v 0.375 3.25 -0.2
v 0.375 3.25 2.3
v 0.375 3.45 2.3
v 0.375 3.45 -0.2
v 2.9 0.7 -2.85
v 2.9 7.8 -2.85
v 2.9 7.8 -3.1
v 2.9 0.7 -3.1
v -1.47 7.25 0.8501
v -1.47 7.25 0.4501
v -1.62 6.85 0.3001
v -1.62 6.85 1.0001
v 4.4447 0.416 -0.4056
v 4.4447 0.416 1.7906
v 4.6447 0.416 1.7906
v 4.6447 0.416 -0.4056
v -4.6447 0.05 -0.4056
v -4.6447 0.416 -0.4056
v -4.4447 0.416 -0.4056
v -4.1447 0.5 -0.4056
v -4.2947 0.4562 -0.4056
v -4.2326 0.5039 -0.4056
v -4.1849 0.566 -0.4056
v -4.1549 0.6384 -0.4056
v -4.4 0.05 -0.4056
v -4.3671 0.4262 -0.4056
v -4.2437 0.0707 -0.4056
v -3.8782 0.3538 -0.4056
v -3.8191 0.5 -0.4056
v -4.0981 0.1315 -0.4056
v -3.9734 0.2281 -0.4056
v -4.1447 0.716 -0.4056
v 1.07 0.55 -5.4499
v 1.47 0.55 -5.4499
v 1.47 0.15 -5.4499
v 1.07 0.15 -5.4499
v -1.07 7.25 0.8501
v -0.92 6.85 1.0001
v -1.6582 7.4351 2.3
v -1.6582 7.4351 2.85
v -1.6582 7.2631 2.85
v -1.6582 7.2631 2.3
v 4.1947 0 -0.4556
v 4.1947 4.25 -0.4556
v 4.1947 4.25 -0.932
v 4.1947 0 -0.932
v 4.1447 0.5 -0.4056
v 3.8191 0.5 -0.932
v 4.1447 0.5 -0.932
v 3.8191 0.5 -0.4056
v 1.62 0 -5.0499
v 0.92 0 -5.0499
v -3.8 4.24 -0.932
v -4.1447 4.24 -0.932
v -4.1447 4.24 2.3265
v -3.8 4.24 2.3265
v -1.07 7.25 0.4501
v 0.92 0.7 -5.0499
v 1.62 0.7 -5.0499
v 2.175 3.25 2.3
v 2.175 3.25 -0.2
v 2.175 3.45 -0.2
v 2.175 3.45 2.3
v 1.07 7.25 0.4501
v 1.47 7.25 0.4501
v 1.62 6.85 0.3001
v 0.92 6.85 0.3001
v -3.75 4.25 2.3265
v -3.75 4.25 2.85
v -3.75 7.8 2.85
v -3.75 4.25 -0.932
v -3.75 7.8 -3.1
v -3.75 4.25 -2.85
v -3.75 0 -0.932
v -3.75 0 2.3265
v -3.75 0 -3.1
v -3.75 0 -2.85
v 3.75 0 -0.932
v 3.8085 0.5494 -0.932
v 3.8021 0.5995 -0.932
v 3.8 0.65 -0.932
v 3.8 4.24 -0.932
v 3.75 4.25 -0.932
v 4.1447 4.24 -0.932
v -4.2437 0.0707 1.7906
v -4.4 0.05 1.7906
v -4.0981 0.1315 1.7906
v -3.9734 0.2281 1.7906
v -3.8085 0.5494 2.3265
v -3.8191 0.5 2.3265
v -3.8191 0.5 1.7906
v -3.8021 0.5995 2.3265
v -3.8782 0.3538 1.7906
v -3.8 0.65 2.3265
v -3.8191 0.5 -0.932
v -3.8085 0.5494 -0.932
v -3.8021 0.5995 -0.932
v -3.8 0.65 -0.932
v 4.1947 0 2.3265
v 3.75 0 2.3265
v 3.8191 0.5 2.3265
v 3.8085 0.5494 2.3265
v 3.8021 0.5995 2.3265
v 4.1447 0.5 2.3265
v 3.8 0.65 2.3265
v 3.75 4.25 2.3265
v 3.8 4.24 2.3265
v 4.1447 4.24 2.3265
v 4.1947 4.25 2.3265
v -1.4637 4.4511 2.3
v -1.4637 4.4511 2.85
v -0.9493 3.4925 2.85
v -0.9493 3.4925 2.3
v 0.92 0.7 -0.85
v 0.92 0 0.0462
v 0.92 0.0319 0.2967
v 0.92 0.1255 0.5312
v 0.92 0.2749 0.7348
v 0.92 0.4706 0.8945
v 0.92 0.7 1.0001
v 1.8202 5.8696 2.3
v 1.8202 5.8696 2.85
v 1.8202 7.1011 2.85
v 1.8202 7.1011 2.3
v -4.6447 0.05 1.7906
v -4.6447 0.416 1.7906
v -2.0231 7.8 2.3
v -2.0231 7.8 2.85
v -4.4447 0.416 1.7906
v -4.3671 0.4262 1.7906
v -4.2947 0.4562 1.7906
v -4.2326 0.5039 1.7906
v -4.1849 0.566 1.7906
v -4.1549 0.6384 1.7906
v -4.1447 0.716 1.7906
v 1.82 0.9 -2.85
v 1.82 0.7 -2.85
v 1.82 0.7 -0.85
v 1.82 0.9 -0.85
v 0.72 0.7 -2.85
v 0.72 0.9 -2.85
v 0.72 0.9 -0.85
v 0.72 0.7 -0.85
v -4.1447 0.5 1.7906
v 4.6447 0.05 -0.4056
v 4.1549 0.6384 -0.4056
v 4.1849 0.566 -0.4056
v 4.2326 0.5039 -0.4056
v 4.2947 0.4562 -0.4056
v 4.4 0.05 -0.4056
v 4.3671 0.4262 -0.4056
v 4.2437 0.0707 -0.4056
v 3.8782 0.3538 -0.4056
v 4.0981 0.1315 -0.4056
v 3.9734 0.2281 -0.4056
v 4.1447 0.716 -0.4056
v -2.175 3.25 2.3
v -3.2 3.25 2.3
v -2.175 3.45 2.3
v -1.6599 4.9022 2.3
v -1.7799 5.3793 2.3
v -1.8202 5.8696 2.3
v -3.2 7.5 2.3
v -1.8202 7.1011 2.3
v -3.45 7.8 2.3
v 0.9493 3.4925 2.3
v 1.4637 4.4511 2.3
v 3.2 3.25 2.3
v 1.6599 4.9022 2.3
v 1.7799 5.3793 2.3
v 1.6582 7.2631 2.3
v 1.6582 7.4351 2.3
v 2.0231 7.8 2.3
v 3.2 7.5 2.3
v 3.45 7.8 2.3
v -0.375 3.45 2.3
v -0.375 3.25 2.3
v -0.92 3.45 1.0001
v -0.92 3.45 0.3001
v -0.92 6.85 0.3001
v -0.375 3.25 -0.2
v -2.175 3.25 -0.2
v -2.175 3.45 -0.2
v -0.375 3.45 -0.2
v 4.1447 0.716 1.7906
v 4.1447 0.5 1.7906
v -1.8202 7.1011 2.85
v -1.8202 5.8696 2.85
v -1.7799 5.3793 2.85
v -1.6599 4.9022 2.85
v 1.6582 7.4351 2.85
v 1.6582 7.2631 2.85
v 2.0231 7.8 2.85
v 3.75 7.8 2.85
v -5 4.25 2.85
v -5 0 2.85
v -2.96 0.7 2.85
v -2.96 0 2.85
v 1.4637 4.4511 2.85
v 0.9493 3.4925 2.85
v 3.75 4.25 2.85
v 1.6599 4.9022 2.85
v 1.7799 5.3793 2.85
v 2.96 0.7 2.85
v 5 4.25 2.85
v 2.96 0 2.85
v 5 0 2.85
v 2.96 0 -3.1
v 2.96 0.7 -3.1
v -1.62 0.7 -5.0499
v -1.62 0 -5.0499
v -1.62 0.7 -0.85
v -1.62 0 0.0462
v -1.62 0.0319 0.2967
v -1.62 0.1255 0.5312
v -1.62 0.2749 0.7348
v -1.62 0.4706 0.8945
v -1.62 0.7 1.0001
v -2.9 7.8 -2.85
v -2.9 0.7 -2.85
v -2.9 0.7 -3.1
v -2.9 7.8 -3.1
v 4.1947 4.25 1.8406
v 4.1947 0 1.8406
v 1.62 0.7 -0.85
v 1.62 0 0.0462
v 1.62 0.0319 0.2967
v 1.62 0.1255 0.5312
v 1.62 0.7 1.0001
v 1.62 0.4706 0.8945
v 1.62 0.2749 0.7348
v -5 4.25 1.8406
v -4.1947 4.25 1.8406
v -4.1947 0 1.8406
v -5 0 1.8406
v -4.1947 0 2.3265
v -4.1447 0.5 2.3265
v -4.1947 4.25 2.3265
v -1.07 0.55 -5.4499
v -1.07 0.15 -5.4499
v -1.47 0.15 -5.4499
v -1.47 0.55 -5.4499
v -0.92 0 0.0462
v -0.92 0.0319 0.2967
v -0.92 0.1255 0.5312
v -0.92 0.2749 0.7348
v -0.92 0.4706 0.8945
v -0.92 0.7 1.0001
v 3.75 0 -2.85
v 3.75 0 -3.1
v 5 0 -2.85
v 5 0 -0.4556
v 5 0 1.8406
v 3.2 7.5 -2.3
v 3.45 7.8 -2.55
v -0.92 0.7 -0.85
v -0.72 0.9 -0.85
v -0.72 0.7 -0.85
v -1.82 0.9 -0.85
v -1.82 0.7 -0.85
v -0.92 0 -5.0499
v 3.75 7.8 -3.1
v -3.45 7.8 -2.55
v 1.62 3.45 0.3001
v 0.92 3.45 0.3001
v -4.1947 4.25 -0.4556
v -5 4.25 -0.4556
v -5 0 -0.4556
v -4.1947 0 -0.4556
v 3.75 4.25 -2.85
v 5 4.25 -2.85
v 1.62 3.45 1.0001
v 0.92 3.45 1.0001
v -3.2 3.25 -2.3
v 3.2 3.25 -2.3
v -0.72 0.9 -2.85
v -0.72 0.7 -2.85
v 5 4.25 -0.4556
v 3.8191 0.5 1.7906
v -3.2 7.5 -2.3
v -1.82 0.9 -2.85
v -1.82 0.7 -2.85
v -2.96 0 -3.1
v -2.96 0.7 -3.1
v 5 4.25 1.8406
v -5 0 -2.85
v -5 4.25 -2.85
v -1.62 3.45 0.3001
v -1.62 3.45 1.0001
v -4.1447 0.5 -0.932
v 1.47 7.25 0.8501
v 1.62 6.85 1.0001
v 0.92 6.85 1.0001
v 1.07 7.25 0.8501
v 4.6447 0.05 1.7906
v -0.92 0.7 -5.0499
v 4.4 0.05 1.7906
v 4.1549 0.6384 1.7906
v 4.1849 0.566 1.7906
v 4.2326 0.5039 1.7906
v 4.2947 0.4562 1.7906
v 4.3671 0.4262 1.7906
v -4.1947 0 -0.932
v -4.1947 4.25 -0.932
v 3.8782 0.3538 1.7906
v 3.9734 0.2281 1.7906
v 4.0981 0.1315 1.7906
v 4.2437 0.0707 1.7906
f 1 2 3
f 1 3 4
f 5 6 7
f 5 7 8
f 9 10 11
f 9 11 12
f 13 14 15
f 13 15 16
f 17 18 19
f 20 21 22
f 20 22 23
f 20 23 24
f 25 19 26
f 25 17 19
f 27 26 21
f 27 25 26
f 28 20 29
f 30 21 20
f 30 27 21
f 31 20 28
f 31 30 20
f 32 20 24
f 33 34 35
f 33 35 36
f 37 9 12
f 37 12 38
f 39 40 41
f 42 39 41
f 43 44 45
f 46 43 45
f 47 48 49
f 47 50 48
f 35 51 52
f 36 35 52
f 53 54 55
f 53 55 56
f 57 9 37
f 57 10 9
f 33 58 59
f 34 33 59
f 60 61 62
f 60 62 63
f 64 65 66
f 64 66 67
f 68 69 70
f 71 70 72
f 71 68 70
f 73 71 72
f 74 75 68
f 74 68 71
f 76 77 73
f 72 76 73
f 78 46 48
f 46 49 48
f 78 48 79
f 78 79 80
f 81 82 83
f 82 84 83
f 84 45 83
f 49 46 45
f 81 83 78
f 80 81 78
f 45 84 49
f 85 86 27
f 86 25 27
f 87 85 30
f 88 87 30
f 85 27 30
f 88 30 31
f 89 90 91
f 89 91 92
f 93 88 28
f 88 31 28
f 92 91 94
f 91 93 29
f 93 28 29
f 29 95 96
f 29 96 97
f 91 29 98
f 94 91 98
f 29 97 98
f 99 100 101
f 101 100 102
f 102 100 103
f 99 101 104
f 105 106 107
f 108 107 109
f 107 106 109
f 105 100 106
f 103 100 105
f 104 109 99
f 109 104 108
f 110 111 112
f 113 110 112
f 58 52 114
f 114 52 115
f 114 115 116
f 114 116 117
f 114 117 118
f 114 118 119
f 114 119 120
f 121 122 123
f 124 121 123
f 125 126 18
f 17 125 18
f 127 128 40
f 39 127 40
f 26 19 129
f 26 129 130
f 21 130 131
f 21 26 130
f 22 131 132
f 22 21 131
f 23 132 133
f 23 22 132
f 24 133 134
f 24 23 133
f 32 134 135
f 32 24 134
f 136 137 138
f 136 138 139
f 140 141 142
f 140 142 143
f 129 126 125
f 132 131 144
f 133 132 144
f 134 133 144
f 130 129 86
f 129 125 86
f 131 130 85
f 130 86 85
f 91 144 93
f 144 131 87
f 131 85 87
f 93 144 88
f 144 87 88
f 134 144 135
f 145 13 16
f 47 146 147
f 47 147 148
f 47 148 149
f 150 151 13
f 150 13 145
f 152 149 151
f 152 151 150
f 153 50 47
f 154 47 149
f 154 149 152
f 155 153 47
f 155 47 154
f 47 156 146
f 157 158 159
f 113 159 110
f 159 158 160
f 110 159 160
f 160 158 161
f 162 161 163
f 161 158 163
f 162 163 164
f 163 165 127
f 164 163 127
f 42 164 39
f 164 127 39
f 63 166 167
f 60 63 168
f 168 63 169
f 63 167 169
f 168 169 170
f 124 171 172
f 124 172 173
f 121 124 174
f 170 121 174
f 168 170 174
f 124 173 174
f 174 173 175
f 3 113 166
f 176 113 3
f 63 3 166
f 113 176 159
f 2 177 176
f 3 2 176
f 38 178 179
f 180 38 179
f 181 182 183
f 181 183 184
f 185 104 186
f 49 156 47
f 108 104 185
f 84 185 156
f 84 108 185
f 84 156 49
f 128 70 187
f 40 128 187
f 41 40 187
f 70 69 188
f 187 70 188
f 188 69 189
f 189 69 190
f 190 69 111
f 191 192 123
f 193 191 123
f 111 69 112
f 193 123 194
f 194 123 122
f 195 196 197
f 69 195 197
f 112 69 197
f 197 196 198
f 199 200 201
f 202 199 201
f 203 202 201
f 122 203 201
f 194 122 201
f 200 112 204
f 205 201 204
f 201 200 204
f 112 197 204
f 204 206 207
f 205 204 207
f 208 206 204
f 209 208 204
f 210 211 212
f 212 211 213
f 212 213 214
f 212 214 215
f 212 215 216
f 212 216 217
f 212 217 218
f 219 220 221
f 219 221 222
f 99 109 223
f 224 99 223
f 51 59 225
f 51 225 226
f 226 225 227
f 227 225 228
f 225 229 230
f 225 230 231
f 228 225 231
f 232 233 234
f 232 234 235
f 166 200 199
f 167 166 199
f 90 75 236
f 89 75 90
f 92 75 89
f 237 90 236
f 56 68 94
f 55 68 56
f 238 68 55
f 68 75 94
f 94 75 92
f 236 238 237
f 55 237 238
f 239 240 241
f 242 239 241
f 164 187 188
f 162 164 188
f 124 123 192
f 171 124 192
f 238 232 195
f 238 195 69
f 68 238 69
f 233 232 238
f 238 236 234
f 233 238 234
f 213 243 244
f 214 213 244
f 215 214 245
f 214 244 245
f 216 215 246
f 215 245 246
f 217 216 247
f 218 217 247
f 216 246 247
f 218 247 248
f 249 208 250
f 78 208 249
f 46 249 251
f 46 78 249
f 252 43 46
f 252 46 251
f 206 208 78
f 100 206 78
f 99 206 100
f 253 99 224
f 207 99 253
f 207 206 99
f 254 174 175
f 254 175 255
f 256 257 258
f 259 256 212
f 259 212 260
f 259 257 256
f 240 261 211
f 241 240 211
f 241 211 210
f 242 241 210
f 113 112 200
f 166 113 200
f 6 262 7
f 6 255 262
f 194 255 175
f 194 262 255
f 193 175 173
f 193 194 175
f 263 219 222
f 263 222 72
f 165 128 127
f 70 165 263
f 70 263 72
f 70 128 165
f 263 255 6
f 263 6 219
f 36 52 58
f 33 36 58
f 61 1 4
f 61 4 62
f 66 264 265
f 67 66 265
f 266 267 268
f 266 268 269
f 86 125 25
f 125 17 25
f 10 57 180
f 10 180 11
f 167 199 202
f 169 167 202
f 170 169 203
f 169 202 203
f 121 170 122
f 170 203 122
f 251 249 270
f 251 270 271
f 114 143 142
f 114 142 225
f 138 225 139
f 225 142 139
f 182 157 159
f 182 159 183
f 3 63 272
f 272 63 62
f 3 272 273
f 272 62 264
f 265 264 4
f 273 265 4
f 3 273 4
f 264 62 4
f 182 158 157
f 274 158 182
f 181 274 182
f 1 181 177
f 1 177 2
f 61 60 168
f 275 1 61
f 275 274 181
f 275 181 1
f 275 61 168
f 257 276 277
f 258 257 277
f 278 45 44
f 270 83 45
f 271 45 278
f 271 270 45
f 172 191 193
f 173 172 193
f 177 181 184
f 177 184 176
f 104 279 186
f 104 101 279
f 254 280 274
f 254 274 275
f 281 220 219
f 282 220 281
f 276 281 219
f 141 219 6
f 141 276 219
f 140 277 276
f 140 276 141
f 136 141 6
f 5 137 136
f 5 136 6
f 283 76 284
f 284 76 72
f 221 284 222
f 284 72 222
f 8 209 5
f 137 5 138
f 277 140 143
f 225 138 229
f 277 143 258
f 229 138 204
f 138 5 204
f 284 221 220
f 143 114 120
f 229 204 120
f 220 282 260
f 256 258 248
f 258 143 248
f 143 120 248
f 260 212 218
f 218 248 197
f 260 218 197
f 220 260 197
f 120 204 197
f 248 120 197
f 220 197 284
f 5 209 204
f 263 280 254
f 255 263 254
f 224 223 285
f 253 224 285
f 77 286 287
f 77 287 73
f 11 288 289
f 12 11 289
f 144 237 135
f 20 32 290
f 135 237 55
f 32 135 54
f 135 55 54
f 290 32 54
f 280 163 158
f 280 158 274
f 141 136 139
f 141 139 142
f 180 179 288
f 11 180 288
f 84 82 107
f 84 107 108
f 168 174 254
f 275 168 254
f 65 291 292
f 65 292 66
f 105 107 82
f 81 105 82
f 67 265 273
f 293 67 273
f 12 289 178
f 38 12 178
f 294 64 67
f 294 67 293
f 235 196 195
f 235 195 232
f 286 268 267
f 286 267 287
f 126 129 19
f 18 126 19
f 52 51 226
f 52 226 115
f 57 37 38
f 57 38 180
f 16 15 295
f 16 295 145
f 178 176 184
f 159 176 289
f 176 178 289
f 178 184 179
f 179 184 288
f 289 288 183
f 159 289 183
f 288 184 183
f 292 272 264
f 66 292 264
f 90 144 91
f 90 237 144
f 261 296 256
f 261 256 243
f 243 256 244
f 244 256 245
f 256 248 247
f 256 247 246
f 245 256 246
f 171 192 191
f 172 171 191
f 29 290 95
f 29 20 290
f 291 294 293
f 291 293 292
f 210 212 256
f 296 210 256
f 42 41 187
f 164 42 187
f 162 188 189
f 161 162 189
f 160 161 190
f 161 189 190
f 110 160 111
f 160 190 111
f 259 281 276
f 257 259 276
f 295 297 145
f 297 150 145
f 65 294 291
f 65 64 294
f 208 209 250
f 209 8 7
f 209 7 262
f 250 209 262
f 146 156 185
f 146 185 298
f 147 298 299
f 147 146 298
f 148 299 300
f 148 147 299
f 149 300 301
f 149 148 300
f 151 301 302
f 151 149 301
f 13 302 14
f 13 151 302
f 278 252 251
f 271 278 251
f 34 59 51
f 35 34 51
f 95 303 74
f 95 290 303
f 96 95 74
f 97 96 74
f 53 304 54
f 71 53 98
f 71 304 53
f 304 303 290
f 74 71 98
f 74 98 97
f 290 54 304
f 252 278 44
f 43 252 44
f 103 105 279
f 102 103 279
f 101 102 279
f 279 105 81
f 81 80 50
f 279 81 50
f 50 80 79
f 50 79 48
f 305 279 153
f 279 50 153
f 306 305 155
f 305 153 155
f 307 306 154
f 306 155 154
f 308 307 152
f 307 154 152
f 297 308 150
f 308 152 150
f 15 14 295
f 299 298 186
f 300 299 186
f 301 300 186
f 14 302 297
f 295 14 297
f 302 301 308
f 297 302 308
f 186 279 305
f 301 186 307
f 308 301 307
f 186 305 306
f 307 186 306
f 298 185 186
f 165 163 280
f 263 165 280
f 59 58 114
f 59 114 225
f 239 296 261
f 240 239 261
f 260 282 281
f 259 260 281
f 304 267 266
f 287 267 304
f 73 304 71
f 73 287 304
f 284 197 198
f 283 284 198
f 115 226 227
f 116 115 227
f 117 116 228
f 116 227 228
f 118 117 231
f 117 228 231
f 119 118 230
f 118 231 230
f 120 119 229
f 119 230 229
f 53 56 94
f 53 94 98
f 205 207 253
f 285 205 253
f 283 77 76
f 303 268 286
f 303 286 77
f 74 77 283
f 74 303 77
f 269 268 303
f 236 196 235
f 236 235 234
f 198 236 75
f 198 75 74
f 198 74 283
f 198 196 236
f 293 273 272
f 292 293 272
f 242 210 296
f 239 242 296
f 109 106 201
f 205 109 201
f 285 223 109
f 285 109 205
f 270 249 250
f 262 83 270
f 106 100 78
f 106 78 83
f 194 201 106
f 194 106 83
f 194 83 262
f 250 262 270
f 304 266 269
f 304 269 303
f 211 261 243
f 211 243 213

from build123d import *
from OCP.BRepFilletAPI import BRepFilletAPI_MakeChamfer

# Parameters (mm, degrees)
SKETCH1_W           = 10
SKETCH1_H           = 5.7
BOSS_EXTRUDE1_DEPTH = 4.25
BOSS_EXTRUDE2_DEPTH = 3.55
BOSS_EXTRUDE3_DEPTH = 0.25
SKETCH4_W           = 6.399999999999999
SKETCH4_H           = 4.6
CUT_EXTRUDE1_DEPTH  = 4.55
BOSS_EXTRUDE4_DEPTH = 0.2
BOSS_EXTRUDE5_DEPTH = 4
CHAMFER1_SIZE       = 0.25
CHAMFER1_SIZE2      = 0.3
CUT_EXTRUDE5_DEPTH  = 0.55
CUT_EXTRUDE6_DEPTH  = 12.011017210049216
CHAMFER2_SIZE       = 0.4
CHAMFER2_SIZE2      = 0.15
BOSS_EXTRUDE6_DEPTH = 6.45
CHAMFER3_SIZE       = 0.15
CHAMFER3_SIZE2      = 0.4
CUT_EXTRUDE7_DEPTH  = 2
FILLET1_R           = 1
CUT_EXTRUDE8_DEPTH  = 11.749015904295446
SKETCH13_W          = 0.34470786446686574
SKETCH13_H          = 3.258573050104898
SKETCH13_H_2        = 3.2585730501048964
BOSS_EXTRUDE7_DEPTH = 4.2
SKETCH14_W          = 2.1962459212727503
SKETCH14_H          = 0.3660162451661128
BOSS_EXTRUDE8_DEPTH = 0.5
SKETCH15_W          = 0.34470786446686574
SKETCH15_H          = 0.535927560103362
SKETCH15_H_2        = 0.526399568728786
SKETCH15_H_3        = 0.5263995687287861
CUT_EXTRUDE9_DEPTH  = 0.5
SKETCH16_W          = 0.34470786446686574
SKETCH16_H          = 3.2585730501048964
SKETCH16_H_2        = 3.258573050104898
CUT_EXTRUDE10_DEPTH = 0.01
FILLET3_R           = 0.3
FILLET4_R           = 0.6


with BuildPart() as part:
    # Sketch1 → Boss-Extrude1 (new body)
    with BuildSketch(Plane(origin=(0, 0, 0), x_dir=(1, 0, 0), z_dir=(0, 1, 0))):
        Rectangle(SKETCH1_W, SKETCH1_H)
    extrude(amount=BOSS_EXTRUDE1_DEPTH)

    # Sketch2 → Boss-Extrude2 (add)
    with BuildSketch(Plane(origin=(0, 4.25, 0), x_dir=(1, 0, 0), z_dir=(0, 1, 0))):
        Polygon((-3.75, 2.8499999999999996), (3.75, 2.8499999999999996), (3.7499999999999996, -2.8500000000000005), (-3.7499999999999987, -2.8500000000000005), align=None)
    extrude(amount=BOSS_EXTRUDE2_DEPTH)

    # Sketch3 → Boss-Extrude3 (add)
    with BuildSketch(Plane(origin=(0, 0, -2.8499999999999996), x_dir=(-1, 0, 0), z_dir=(0, 0, -1))):
        Polygon((-3.75, 7.8), (-2.9, 7.8), (-2.899999999999999, 8e-17), (-3.75, 0), align=None)
        Polygon((3.75, 0), (2.899999999999999, 8e-17), (2.9, 7.8), (3.75, 7.8), align=None)
    extrude(amount=BOSS_EXTRUDE3_DEPTH)

    # Sketch4 → Cut-Extrude1 (cut)
    with BuildSketch(Plane(origin=(0, 7.8, 0), x_dir=(1, 0, 0), z_dir=(0, 1, 0))):
        Rectangle(SKETCH4_W, SKETCH4_H)
    extrude(amount=-CUT_EXTRUDE1_DEPTH, mode=Mode.SUBTRACT)

    # Sketch5 → Boss-Extrude4 (add)
    # profile 1 of 2: a face of its own
    with BuildSketch(Plane(origin=(0, 3.2499999999999996, 0), x_dir=(1, 0, 0), z_dir=(0, 1, 0))):
        Polygon((-2.174999999999999, -2.3000000000000003), (-2.174999999999999, 0.19999999999999923), (-0.3749999999999999, 0.1999999999999991), (-0.37499999999999944, -2.3000000000000003), align=None)
        Polygon((-1.6199999999999999, -0.30010615600666696), (-0.9199999999999999, -0.30010615600666696), (-0.9199999999999997, -1.0001061560066669), (-1.6199999999999997, -1.0001061560066669), align=None, mode=Mode.SUBTRACT)
    # profile 2 of 2: a face of its own
    with BuildSketch(Plane(origin=(0, 3.2499999999999996, 0), x_dir=(1, 0, 0), z_dir=(0, 1, 0))):
        Polygon((2.174999999999999, -2.3000000000000003), (0.37499999999999944, -2.3000000000000003), (0.3749999999999999, 0.1999999999999991), (2.174999999999999, 0.19999999999999923), align=None)
        Polygon((1.6199999999999997, -1.0001061560066669), (0.9199999999999997, -1.0001061560066669), (0.9199999999999999, -0.30010615600666696), (1.6199999999999999, -0.30010615600666696), align=None, mode=Mode.SUBTRACT)
    extrude(amount=BOSS_EXTRUDE4_DEPTH)

    # Sketch6 → Boss-Extrude5 (add)
    with BuildSketch(Plane(origin=(0, 3.2499999999999996, 0), x_dir=(1, 0, 0), z_dir=(0, 1, 0))):
        Polygon((-0.9199999999999997, -1.0001061560066669), (-0.9199999999999999, -0.30010615600666696), (-1.6199999999999999, -0.30010615600666696), (-1.6199999999999997, -1.0001061560066669), align=None)
        Polygon((1.6199999999999997, -1.0001061560066669), (1.6199999999999999, -0.30010615600666696), (0.9199999999999999, -0.30010615600666696), (0.9199999999999997, -1.0001061560066669), align=None)
    extrude(amount=BOSS_EXTRUDE5_DEPTH)

    # Chamfer1
    chamfer1_edges = [part.edges().sort_by_distance(p)[0] for p in [
        (3.1999999999999993, 7.8, 4.4e-16),
        (4.4e-16, 7.8, -2.2999999999999994),
        (-3.199999999999999, 7.8, 4.4e-16),
    ]]
    chamfer1_side = [part.faces().sort_by_distance(p)[0] for p in [
        (-2.99573531218939, 7.8, -2.9749999999999996),
    ]]
    chamfer(chamfer1_edges, length=CHAMFER1_SIZE, length2=CHAMFER1_SIZE2, reference=chamfer1_side[0])

    # Sketch7 → Cut-Extrude5 (cut)
    with BuildSketch(Plane.XY.offset(2.8500000000000005)):
        with BuildLine():
            Line((-2.0230768172750717, 7.8), (-1.658152916079166, 7.435076098804102))
            Line((-1.658152916079166, 7.435076098804102), (-1.658152916079166, 7.263136663157135))
            Line((-1.658152916079166, 7.263136663157135), (-1.8201957124672143, 7.101093866769083))
            Line((-1.8201957124672143, 7.101093866769083), (-1.820195712467214, 5.869596920770719))
            ThreePointArc((-1.820195712467214, 5.869596920770719), (-1.729701032325909, 5.138311207992215), (-1.4636765166579089, 4.4511438063269075))
            Line((-1.4636765166579089, 4.4511438063269075), (-0.9492914576822651, 3.492517105508663))
            Line((-0.9492914576822651, 3.492517105508663), (0.9492914576822654, 3.492517105508663))
            Line((0.9492914576822654, 3.492517105508663), (1.4636765166579093, 4.4511438063269075))
            ThreePointArc((1.4636765166579093, 4.4511438063269075), (1.7297010323259099, 5.1383112079922135), (1.8201957124672148, 5.869596920770719))
            Line((1.8201957124672148, 5.869596920770719), (1.8201957124672143, 7.101093866769083))
            Line((1.8201957124672143, 7.101093866769083), (1.6581529160791668, 7.263136663157135))
            Line((1.6581529160791668, 7.263136663157135), (1.6581529160791668, 7.435076098804102))
            Line((1.6581529160791668, 7.435076098804102), (2.0230768172750717, 7.8))
            Line((2.0230768172750717, 7.8), (-2.0230768172750717, 7.8))
        make_face()
    extrude(amount=-CUT_EXTRUDE5_DEPTH, mode=Mode.SUBTRACT)

    # Sketch8 → Cut-Extrude6 (cut, through all)
    with BuildSketch(Plane.XY.offset(2.8500000000000005)):
        Polygon((-2.96, 0), (2.96, 0), (2.96, 0.7000000000000003), (-2.96, 0.7), align=None)
    extrude(amount=-CUT_EXTRUDE6_DEPTH, mode=Mode.SUBTRACT)

    # Chamfer2: one chamfer whose edges measure the first distance from different faces: ONE call of the kernel's chamfer builder (chamfer() names one face for all edges)
    chamfer2_edges_1 = [part.edges().sort_by_distance(p)[0] for p in [
        (-1.2699999999999996, 7.25, 1.0001061560066669),
    ]]
    chamfer2_side_1 = [part.faces().sort_by_distance(p)[0] for p in [
        (-1.2699999999999998, 5.35, 1.0001061560066669),
    ]]
    chamfer2_edges_2 = [part.edges().sort_by_distance(p)[0] for p in [
        (-0.9199999999999998, 7.25, 0.6501061560066669),
    ]]
    chamfer2_side_2 = [part.faces().sort_by_distance(p)[0] for p in [
        (-0.9199999999999998, 5.35, 0.6501061560066669),
    ]]
    chamfer2_edges_3 = [part.edges().sort_by_distance(p)[0] for p in [
        (-1.27, 7.25, 0.30010615600666696),
    ]]
    chamfer2_side_3 = [part.faces().sort_by_distance(p)[0] for p in [
        (-1.2699999999999998, 5.35, 0.30010615600666696),
    ]]
    chamfer2_edges_4 = [part.edges().sort_by_distance(p)[0] for p in [
        (-1.6199999999999997, 7.25, 0.650106156006667),
    ]]
    chamfer2_side_4 = [part.faces().sort_by_distance(p)[0] for p in [
        (-1.6199999999999997, 5.35, 0.650106156006667),
    ]]
    chamfer2_edges_5 = [part.edges().sort_by_distance(p)[0] for p in [
        (1.2699999999999996, 7.25, 1.0001061560066669),
    ]]
    chamfer2_side_5 = [part.faces().sort_by_distance(p)[0] for p in [
        (1.2699999999999998, 5.35, 1.0001061560066669),
    ]]
    chamfer2_edges_6 = [part.edges().sort_by_distance(p)[0] for p in [
        (1.6199999999999997, 7.25, 0.6501061560066669),
    ]]
    chamfer2_side_6 = [part.faces().sort_by_distance(p)[0] for p in [
        (1.6199999999999997, 5.35, 0.6501061560066669),
    ]]
    chamfer2_edges_7 = [part.edges().sort_by_distance(p)[0] for p in [
        (1.27, 7.25, 0.30010615600666696),
    ]]
    chamfer2_side_7 = [part.faces().sort_by_distance(p)[0] for p in [
        (1.2699999999999998, 5.35, 0.30010615600666696),
    ]]
    chamfer2_edges_8 = [part.edges().sort_by_distance(p)[0] for p in [
        (0.9199999999999998, 7.25, 0.650106156006667),
    ]]
    chamfer2_side_8 = [part.faces().sort_by_distance(p)[0] for p in [
        (0.9199999999999998, 5.35, 0.650106156006667),
    ]]
    chamfer2 = BRepFilletAPI_MakeChamfer(part.part.solid().wrapped)
    for e in chamfer2_edges_1:
        chamfer2.Add(CHAMFER2_SIZE, CHAMFER2_SIZE2, e.wrapped, chamfer2_side_1[0].wrapped)  # the first distance lies on this face
    for e in chamfer2_edges_2:
        chamfer2.Add(CHAMFER2_SIZE, CHAMFER2_SIZE2, e.wrapped, chamfer2_side_2[0].wrapped)  # the first distance lies on this face
    for e in chamfer2_edges_3:
        chamfer2.Add(CHAMFER2_SIZE, CHAMFER2_SIZE2, e.wrapped, chamfer2_side_3[0].wrapped)  # the first distance lies on this face
    for e in chamfer2_edges_4:
        chamfer2.Add(CHAMFER2_SIZE, CHAMFER2_SIZE2, e.wrapped, chamfer2_side_4[0].wrapped)  # the first distance lies on this face
    for e in chamfer2_edges_5:
        chamfer2.Add(CHAMFER2_SIZE, CHAMFER2_SIZE2, e.wrapped, chamfer2_side_5[0].wrapped)  # the first distance lies on this face
    for e in chamfer2_edges_6:
        chamfer2.Add(CHAMFER2_SIZE, CHAMFER2_SIZE2, e.wrapped, chamfer2_side_6[0].wrapped)  # the first distance lies on this face
    for e in chamfer2_edges_7:
        chamfer2.Add(CHAMFER2_SIZE, CHAMFER2_SIZE2, e.wrapped, chamfer2_side_7[0].wrapped)  # the first distance lies on this face
    for e in chamfer2_edges_8:
        chamfer2.Add(CHAMFER2_SIZE, CHAMFER2_SIZE2, e.wrapped, chamfer2_side_8[0].wrapped)  # the first distance lies on this face
    add(Compound.cast(chamfer2.Shape()), mode=Mode.REPLACE)

    # Sketch10 → Boss-Extrude6 (add)
    with BuildSketch(Plane.XY.offset(1.0001061560066669)):
        Polygon((-1.6199999999999999, 0.7000000000000003), (-0.9199999999999997, 0.7000000000000003), (-0.9199999999999996, 0), (-1.6199999999999994, 0), align=None)
        Polygon((1.6199999999999994, 0), (0.9199999999999996, 0), (0.9199999999999997, 0.7000000000000003), (1.6199999999999999, 0.7000000000000003), align=None)
    extrude(amount=-BOSS_EXTRUDE6_DEPTH)

    # Chamfer3: one chamfer whose edges measure the first distance from different faces: ONE call of the kernel's chamfer builder (chamfer() names one face for all edges)
    chamfer3_edges_1 = [part.edges().sort_by_distance(p)[0] for p in [
        (-1.2699999999999998, 0.7000000000000003, -5.449893843993333),
        (-1.6199999999999997, 0.35000000000000014, -5.449893843993333),
        (-0.9199999999999997, 0.35000000000000014, -5.449893843993333),
        (-1.2699999999999996, 0, -5.449893843993333),
    ]]
    chamfer3_side_1 = [part.faces().sort_by_distance(p)[0] for p in [
        (-1.2699999999999996, 0.3500000000000002, -5.449893843993333),
    ]]
    chamfer3_edges_2 = [part.edges().sort_by_distance(p)[0] for p in [
        (1.2699999999999998, 0.7000000000000003, -5.449893843993333),
        (1.6199999999999997, 0.35000000000000014, -5.449893843993333),
        (1.2699999999999996, 0, -5.449893843993333),
        (0.9199999999999997, 0.35000000000000014, -5.449893843993333),
    ]]
    chamfer3_side_2 = [part.faces().sort_by_distance(p)[0] for p in [
        (1.2699999999999996, 0.3500000000000002, -5.449893843993333),
    ]]
    chamfer3 = BRepFilletAPI_MakeChamfer(part.part.solid().wrapped)
    for e in chamfer3_edges_1:
        chamfer3.Add(CHAMFER3_SIZE, CHAMFER3_SIZE2, e.wrapped, chamfer3_side_1[0].wrapped)  # the first distance lies on this face
    for e in chamfer3_edges_2:
        chamfer3.Add(CHAMFER3_SIZE, CHAMFER3_SIZE2, e.wrapped, chamfer3_side_2[0].wrapped)  # the first distance lies on this face
    add(Compound.cast(chamfer3.Shape()), mode=Mode.REPLACE)

    # Sketch11 → Cut-Extrude7 (cut)
    with BuildSketch(Plane(origin=(0, 0, -2.8499999999999996), x_dir=(-1, 0, 0), z_dir=(0, 0, -1))):
        Polygon((-1.8200000000000005, 0.9000000000000004), (-0.7200000000000002, 0.9000000000000004), (-0.7200000000000002, 0.7000000000000004), (-1.82, 0.7000000000000004), align=None)
        Polygon((1.8199999999999994, 0.9000000000000004), (0.7199999999999993, 0.9000000000000004), (0.7199999999999993, 0.7000000000000004), (1.8199999999999992, 0.7000000000000004), align=None)
    extrude(amount=-CUT_EXTRUDE7_DEPTH, mode=Mode.SUBTRACT)

    # Fillet1
    # the kernel refuses this fillet: 1 mm, written as the material it takes off along each edge
    with BuildSketch(Plane(origin=(1.464848003542365, 0, 1.0001061560066669), x_dir=(0, 0, -1), z_dir=(-1, 0, 0))) as fillet1_piece_1:
        with BuildLine():
            CenterArc((0.9539392014169458, -1), FILLET1_R, 90, 72.54239687627793)
            Line((0, -0.7000000000000003), (0, 0))
            Line((0, 0), (0.9539392014169458, 0))
        make_face()
    extrude(amount=3.0848480035423647, mode=Mode.SUBTRACT)
    with BuildSketch(Plane(origin=(1.6199999999999994, 0, 1.0001061560066669), x_dir=(0, 0, -1), z_dir=(-1, 0, 0))) as fillet1_piece_2:
        with BuildLine():
            CenterArc((0.9539392014169458, -1), FILLET1_R, 90, 72.54239687627793)
            Line((0, -0.7000000000000003), (0, 0))
            Line((0, 0), (0.9539392014169458, 0))
        make_face()
    extrude(amount=3.0848480035423638, mode=Mode.SUBTRACT)

    # Sketch12 → Cut-Extrude8 (cut, through all)
    with BuildSketch(Plane(origin=(0, 7.8, 0), x_dir=(1, 0, 0), z_dir=(0, 1, 0))):
        Polygon((5, 0.4556412762642724), (4.194707864466865, 0.4556412762642724), (4.194707864466865, 0.9320408449930586), (3.75, 0.9320408449930585), (3.750000000000001, -2.32653220511184), (4.194707864466865, -2.32653220511184), (4.194707864466865, -1.8406046450084779), (5, -1.8406046450084779), align=None)
        Polygon((-4.194707864466865, -1.8406046450084779), (-5, -1.8406046450084779), (-5, 0.4556412762642724), (-4.194707864466865, 0.4556412762642724), (-4.194707864466865, 0.9320408449930586), (-3.75, 0.9320408449930585), (-3.750000000000001, -2.32653220511184), (-4.194707864466865, -2.32653220511184), align=None)
    extrude(amount=-CUT_EXTRUDE8_DEPTH, mode=Mode.SUBTRACT)

    # Sketch13 → Boss-Extrude7 (add)
    with BuildSketch(Plane(origin=(0, 4.25, 0), x_dir=(1, 0, 0), z_dir=(0, 1, 0))):
        with Locations((3.9723539322334327, -0.6972456800593906)):
            Rectangle(SKETCH13_W, SKETCH13_H)
        with Locations((-3.9723539322334327, -0.6972456800593899)):
            Rectangle(SKETCH13_W, SKETCH13_H_2)
    extrude(amount=-BOSS_EXTRUDE7_DEPTH)

    # Sketch14 → Boss-Extrude8 (add)
    with BuildSketch(Plane(origin=(4.144707864466866, 0, 0), x_dir=(0, 0, -1), z_dir=(1, 0, 0))):
        with Locations((-0.6924816843721028, 0.23300812258305612)):
            Rectangle(SKETCH14_W, SKETCH14_H)
    boss_extrude8 = extrude(amount=BOSS_EXTRUDE8_DEPTH)

    # Mirror3: Boss-Extrude8 across plane
    add(boss_extrude8.mirror(Plane(origin=(0, 0, 0), x_dir=(0, 0, 1), z_dir=(1, 0, 0))))

    # Sketch15 → Cut-Extrude9 (cut)
    with BuildSketch(Plane.XZ):
        with Locations((-3.9723539322334327, 2.058568425060159)):
            Rectangle(SKETCH15_W, SKETCH15_H)
        with Locations((-3.9723539322334327, -0.6688410606286654)):
            Rectangle(SKETCH15_W, SKETCH15_H_2)
        with Locations((3.9723539322334327, 2.058568425060159)):
            Rectangle(SKETCH15_W, SKETCH15_H)
        with Locations((3.9723539322334327, -0.6688410606286654)):
            Rectangle(SKETCH15_W, SKETCH15_H_3)
    extrude(amount=-CUT_EXTRUDE9_DEPTH, mode=Mode.SUBTRACT)

    # Sketch16 → Cut-Extrude10 (cut)
    with BuildSketch(Plane(origin=(0, 4.25, 0), x_dir=(1, 0, 0), z_dir=(0, 1, 0))):
        with Locations((-3.9723539322334327, -0.6972456800593899)):
            Rectangle(SKETCH16_W, SKETCH16_H)
        with Locations((3.9723539322334327, -0.6972456800593906)):
            Rectangle(SKETCH16_W, SKETCH16_H_2)
    extrude(amount=-CUT_EXTRUDE10_DEPTH, mode=Mode.SUBTRACT)

    # Fillet3
    # the kernel refuses this fillet: 0.3 mm, written as the material it adds along each edge
    with BuildSketch(Plane(origin=(4.144707864466866, 0.4160162451661125, -0.4056412762642723), x_dir=(0, 1, 0), z_dir=(0, 0, 1))) as fillet3_piece_1:
        with BuildLine():
            CenterArc((FILLET3_R, -FILLET3_R), FILLET3_R, 90, 90)
            Line((0, -FILLET3_R), (0, 0))
            Line((0, 0), (FILLET3_R, 0))
        make_face()
    extrude(amount=2.1962459212727503)
    with BuildSketch(Plane(origin=(-4.144707864466866, 0.4160162451661125, -0.4056412762642723), x_dir=(-1, 0, 0), z_dir=(0, 0, 1))) as fillet3_piece_2:
        with BuildLine():
            CenterArc((FILLET3_R, -FILLET3_R), FILLET3_R, 90, 90)
            Line((0, -FILLET3_R), (0, 0))
            Line((0, 0), (FILLET3_R, 0))
        make_face()
    extrude(amount=2.1962459212727503)

    # Fillet4
    fillet4_edges = [part.edges().sort_by_distance(p)[0] for p in [
        (3.7999999999999994, 0.04999999999999982, 0.6924816843721027),
        (-3.7999999999999994, 0.04999999999999982, 0.6924816843721029),
    ]]
    fillet(fillet4_edges, radius=FILLET4_R)


solid = part.part
